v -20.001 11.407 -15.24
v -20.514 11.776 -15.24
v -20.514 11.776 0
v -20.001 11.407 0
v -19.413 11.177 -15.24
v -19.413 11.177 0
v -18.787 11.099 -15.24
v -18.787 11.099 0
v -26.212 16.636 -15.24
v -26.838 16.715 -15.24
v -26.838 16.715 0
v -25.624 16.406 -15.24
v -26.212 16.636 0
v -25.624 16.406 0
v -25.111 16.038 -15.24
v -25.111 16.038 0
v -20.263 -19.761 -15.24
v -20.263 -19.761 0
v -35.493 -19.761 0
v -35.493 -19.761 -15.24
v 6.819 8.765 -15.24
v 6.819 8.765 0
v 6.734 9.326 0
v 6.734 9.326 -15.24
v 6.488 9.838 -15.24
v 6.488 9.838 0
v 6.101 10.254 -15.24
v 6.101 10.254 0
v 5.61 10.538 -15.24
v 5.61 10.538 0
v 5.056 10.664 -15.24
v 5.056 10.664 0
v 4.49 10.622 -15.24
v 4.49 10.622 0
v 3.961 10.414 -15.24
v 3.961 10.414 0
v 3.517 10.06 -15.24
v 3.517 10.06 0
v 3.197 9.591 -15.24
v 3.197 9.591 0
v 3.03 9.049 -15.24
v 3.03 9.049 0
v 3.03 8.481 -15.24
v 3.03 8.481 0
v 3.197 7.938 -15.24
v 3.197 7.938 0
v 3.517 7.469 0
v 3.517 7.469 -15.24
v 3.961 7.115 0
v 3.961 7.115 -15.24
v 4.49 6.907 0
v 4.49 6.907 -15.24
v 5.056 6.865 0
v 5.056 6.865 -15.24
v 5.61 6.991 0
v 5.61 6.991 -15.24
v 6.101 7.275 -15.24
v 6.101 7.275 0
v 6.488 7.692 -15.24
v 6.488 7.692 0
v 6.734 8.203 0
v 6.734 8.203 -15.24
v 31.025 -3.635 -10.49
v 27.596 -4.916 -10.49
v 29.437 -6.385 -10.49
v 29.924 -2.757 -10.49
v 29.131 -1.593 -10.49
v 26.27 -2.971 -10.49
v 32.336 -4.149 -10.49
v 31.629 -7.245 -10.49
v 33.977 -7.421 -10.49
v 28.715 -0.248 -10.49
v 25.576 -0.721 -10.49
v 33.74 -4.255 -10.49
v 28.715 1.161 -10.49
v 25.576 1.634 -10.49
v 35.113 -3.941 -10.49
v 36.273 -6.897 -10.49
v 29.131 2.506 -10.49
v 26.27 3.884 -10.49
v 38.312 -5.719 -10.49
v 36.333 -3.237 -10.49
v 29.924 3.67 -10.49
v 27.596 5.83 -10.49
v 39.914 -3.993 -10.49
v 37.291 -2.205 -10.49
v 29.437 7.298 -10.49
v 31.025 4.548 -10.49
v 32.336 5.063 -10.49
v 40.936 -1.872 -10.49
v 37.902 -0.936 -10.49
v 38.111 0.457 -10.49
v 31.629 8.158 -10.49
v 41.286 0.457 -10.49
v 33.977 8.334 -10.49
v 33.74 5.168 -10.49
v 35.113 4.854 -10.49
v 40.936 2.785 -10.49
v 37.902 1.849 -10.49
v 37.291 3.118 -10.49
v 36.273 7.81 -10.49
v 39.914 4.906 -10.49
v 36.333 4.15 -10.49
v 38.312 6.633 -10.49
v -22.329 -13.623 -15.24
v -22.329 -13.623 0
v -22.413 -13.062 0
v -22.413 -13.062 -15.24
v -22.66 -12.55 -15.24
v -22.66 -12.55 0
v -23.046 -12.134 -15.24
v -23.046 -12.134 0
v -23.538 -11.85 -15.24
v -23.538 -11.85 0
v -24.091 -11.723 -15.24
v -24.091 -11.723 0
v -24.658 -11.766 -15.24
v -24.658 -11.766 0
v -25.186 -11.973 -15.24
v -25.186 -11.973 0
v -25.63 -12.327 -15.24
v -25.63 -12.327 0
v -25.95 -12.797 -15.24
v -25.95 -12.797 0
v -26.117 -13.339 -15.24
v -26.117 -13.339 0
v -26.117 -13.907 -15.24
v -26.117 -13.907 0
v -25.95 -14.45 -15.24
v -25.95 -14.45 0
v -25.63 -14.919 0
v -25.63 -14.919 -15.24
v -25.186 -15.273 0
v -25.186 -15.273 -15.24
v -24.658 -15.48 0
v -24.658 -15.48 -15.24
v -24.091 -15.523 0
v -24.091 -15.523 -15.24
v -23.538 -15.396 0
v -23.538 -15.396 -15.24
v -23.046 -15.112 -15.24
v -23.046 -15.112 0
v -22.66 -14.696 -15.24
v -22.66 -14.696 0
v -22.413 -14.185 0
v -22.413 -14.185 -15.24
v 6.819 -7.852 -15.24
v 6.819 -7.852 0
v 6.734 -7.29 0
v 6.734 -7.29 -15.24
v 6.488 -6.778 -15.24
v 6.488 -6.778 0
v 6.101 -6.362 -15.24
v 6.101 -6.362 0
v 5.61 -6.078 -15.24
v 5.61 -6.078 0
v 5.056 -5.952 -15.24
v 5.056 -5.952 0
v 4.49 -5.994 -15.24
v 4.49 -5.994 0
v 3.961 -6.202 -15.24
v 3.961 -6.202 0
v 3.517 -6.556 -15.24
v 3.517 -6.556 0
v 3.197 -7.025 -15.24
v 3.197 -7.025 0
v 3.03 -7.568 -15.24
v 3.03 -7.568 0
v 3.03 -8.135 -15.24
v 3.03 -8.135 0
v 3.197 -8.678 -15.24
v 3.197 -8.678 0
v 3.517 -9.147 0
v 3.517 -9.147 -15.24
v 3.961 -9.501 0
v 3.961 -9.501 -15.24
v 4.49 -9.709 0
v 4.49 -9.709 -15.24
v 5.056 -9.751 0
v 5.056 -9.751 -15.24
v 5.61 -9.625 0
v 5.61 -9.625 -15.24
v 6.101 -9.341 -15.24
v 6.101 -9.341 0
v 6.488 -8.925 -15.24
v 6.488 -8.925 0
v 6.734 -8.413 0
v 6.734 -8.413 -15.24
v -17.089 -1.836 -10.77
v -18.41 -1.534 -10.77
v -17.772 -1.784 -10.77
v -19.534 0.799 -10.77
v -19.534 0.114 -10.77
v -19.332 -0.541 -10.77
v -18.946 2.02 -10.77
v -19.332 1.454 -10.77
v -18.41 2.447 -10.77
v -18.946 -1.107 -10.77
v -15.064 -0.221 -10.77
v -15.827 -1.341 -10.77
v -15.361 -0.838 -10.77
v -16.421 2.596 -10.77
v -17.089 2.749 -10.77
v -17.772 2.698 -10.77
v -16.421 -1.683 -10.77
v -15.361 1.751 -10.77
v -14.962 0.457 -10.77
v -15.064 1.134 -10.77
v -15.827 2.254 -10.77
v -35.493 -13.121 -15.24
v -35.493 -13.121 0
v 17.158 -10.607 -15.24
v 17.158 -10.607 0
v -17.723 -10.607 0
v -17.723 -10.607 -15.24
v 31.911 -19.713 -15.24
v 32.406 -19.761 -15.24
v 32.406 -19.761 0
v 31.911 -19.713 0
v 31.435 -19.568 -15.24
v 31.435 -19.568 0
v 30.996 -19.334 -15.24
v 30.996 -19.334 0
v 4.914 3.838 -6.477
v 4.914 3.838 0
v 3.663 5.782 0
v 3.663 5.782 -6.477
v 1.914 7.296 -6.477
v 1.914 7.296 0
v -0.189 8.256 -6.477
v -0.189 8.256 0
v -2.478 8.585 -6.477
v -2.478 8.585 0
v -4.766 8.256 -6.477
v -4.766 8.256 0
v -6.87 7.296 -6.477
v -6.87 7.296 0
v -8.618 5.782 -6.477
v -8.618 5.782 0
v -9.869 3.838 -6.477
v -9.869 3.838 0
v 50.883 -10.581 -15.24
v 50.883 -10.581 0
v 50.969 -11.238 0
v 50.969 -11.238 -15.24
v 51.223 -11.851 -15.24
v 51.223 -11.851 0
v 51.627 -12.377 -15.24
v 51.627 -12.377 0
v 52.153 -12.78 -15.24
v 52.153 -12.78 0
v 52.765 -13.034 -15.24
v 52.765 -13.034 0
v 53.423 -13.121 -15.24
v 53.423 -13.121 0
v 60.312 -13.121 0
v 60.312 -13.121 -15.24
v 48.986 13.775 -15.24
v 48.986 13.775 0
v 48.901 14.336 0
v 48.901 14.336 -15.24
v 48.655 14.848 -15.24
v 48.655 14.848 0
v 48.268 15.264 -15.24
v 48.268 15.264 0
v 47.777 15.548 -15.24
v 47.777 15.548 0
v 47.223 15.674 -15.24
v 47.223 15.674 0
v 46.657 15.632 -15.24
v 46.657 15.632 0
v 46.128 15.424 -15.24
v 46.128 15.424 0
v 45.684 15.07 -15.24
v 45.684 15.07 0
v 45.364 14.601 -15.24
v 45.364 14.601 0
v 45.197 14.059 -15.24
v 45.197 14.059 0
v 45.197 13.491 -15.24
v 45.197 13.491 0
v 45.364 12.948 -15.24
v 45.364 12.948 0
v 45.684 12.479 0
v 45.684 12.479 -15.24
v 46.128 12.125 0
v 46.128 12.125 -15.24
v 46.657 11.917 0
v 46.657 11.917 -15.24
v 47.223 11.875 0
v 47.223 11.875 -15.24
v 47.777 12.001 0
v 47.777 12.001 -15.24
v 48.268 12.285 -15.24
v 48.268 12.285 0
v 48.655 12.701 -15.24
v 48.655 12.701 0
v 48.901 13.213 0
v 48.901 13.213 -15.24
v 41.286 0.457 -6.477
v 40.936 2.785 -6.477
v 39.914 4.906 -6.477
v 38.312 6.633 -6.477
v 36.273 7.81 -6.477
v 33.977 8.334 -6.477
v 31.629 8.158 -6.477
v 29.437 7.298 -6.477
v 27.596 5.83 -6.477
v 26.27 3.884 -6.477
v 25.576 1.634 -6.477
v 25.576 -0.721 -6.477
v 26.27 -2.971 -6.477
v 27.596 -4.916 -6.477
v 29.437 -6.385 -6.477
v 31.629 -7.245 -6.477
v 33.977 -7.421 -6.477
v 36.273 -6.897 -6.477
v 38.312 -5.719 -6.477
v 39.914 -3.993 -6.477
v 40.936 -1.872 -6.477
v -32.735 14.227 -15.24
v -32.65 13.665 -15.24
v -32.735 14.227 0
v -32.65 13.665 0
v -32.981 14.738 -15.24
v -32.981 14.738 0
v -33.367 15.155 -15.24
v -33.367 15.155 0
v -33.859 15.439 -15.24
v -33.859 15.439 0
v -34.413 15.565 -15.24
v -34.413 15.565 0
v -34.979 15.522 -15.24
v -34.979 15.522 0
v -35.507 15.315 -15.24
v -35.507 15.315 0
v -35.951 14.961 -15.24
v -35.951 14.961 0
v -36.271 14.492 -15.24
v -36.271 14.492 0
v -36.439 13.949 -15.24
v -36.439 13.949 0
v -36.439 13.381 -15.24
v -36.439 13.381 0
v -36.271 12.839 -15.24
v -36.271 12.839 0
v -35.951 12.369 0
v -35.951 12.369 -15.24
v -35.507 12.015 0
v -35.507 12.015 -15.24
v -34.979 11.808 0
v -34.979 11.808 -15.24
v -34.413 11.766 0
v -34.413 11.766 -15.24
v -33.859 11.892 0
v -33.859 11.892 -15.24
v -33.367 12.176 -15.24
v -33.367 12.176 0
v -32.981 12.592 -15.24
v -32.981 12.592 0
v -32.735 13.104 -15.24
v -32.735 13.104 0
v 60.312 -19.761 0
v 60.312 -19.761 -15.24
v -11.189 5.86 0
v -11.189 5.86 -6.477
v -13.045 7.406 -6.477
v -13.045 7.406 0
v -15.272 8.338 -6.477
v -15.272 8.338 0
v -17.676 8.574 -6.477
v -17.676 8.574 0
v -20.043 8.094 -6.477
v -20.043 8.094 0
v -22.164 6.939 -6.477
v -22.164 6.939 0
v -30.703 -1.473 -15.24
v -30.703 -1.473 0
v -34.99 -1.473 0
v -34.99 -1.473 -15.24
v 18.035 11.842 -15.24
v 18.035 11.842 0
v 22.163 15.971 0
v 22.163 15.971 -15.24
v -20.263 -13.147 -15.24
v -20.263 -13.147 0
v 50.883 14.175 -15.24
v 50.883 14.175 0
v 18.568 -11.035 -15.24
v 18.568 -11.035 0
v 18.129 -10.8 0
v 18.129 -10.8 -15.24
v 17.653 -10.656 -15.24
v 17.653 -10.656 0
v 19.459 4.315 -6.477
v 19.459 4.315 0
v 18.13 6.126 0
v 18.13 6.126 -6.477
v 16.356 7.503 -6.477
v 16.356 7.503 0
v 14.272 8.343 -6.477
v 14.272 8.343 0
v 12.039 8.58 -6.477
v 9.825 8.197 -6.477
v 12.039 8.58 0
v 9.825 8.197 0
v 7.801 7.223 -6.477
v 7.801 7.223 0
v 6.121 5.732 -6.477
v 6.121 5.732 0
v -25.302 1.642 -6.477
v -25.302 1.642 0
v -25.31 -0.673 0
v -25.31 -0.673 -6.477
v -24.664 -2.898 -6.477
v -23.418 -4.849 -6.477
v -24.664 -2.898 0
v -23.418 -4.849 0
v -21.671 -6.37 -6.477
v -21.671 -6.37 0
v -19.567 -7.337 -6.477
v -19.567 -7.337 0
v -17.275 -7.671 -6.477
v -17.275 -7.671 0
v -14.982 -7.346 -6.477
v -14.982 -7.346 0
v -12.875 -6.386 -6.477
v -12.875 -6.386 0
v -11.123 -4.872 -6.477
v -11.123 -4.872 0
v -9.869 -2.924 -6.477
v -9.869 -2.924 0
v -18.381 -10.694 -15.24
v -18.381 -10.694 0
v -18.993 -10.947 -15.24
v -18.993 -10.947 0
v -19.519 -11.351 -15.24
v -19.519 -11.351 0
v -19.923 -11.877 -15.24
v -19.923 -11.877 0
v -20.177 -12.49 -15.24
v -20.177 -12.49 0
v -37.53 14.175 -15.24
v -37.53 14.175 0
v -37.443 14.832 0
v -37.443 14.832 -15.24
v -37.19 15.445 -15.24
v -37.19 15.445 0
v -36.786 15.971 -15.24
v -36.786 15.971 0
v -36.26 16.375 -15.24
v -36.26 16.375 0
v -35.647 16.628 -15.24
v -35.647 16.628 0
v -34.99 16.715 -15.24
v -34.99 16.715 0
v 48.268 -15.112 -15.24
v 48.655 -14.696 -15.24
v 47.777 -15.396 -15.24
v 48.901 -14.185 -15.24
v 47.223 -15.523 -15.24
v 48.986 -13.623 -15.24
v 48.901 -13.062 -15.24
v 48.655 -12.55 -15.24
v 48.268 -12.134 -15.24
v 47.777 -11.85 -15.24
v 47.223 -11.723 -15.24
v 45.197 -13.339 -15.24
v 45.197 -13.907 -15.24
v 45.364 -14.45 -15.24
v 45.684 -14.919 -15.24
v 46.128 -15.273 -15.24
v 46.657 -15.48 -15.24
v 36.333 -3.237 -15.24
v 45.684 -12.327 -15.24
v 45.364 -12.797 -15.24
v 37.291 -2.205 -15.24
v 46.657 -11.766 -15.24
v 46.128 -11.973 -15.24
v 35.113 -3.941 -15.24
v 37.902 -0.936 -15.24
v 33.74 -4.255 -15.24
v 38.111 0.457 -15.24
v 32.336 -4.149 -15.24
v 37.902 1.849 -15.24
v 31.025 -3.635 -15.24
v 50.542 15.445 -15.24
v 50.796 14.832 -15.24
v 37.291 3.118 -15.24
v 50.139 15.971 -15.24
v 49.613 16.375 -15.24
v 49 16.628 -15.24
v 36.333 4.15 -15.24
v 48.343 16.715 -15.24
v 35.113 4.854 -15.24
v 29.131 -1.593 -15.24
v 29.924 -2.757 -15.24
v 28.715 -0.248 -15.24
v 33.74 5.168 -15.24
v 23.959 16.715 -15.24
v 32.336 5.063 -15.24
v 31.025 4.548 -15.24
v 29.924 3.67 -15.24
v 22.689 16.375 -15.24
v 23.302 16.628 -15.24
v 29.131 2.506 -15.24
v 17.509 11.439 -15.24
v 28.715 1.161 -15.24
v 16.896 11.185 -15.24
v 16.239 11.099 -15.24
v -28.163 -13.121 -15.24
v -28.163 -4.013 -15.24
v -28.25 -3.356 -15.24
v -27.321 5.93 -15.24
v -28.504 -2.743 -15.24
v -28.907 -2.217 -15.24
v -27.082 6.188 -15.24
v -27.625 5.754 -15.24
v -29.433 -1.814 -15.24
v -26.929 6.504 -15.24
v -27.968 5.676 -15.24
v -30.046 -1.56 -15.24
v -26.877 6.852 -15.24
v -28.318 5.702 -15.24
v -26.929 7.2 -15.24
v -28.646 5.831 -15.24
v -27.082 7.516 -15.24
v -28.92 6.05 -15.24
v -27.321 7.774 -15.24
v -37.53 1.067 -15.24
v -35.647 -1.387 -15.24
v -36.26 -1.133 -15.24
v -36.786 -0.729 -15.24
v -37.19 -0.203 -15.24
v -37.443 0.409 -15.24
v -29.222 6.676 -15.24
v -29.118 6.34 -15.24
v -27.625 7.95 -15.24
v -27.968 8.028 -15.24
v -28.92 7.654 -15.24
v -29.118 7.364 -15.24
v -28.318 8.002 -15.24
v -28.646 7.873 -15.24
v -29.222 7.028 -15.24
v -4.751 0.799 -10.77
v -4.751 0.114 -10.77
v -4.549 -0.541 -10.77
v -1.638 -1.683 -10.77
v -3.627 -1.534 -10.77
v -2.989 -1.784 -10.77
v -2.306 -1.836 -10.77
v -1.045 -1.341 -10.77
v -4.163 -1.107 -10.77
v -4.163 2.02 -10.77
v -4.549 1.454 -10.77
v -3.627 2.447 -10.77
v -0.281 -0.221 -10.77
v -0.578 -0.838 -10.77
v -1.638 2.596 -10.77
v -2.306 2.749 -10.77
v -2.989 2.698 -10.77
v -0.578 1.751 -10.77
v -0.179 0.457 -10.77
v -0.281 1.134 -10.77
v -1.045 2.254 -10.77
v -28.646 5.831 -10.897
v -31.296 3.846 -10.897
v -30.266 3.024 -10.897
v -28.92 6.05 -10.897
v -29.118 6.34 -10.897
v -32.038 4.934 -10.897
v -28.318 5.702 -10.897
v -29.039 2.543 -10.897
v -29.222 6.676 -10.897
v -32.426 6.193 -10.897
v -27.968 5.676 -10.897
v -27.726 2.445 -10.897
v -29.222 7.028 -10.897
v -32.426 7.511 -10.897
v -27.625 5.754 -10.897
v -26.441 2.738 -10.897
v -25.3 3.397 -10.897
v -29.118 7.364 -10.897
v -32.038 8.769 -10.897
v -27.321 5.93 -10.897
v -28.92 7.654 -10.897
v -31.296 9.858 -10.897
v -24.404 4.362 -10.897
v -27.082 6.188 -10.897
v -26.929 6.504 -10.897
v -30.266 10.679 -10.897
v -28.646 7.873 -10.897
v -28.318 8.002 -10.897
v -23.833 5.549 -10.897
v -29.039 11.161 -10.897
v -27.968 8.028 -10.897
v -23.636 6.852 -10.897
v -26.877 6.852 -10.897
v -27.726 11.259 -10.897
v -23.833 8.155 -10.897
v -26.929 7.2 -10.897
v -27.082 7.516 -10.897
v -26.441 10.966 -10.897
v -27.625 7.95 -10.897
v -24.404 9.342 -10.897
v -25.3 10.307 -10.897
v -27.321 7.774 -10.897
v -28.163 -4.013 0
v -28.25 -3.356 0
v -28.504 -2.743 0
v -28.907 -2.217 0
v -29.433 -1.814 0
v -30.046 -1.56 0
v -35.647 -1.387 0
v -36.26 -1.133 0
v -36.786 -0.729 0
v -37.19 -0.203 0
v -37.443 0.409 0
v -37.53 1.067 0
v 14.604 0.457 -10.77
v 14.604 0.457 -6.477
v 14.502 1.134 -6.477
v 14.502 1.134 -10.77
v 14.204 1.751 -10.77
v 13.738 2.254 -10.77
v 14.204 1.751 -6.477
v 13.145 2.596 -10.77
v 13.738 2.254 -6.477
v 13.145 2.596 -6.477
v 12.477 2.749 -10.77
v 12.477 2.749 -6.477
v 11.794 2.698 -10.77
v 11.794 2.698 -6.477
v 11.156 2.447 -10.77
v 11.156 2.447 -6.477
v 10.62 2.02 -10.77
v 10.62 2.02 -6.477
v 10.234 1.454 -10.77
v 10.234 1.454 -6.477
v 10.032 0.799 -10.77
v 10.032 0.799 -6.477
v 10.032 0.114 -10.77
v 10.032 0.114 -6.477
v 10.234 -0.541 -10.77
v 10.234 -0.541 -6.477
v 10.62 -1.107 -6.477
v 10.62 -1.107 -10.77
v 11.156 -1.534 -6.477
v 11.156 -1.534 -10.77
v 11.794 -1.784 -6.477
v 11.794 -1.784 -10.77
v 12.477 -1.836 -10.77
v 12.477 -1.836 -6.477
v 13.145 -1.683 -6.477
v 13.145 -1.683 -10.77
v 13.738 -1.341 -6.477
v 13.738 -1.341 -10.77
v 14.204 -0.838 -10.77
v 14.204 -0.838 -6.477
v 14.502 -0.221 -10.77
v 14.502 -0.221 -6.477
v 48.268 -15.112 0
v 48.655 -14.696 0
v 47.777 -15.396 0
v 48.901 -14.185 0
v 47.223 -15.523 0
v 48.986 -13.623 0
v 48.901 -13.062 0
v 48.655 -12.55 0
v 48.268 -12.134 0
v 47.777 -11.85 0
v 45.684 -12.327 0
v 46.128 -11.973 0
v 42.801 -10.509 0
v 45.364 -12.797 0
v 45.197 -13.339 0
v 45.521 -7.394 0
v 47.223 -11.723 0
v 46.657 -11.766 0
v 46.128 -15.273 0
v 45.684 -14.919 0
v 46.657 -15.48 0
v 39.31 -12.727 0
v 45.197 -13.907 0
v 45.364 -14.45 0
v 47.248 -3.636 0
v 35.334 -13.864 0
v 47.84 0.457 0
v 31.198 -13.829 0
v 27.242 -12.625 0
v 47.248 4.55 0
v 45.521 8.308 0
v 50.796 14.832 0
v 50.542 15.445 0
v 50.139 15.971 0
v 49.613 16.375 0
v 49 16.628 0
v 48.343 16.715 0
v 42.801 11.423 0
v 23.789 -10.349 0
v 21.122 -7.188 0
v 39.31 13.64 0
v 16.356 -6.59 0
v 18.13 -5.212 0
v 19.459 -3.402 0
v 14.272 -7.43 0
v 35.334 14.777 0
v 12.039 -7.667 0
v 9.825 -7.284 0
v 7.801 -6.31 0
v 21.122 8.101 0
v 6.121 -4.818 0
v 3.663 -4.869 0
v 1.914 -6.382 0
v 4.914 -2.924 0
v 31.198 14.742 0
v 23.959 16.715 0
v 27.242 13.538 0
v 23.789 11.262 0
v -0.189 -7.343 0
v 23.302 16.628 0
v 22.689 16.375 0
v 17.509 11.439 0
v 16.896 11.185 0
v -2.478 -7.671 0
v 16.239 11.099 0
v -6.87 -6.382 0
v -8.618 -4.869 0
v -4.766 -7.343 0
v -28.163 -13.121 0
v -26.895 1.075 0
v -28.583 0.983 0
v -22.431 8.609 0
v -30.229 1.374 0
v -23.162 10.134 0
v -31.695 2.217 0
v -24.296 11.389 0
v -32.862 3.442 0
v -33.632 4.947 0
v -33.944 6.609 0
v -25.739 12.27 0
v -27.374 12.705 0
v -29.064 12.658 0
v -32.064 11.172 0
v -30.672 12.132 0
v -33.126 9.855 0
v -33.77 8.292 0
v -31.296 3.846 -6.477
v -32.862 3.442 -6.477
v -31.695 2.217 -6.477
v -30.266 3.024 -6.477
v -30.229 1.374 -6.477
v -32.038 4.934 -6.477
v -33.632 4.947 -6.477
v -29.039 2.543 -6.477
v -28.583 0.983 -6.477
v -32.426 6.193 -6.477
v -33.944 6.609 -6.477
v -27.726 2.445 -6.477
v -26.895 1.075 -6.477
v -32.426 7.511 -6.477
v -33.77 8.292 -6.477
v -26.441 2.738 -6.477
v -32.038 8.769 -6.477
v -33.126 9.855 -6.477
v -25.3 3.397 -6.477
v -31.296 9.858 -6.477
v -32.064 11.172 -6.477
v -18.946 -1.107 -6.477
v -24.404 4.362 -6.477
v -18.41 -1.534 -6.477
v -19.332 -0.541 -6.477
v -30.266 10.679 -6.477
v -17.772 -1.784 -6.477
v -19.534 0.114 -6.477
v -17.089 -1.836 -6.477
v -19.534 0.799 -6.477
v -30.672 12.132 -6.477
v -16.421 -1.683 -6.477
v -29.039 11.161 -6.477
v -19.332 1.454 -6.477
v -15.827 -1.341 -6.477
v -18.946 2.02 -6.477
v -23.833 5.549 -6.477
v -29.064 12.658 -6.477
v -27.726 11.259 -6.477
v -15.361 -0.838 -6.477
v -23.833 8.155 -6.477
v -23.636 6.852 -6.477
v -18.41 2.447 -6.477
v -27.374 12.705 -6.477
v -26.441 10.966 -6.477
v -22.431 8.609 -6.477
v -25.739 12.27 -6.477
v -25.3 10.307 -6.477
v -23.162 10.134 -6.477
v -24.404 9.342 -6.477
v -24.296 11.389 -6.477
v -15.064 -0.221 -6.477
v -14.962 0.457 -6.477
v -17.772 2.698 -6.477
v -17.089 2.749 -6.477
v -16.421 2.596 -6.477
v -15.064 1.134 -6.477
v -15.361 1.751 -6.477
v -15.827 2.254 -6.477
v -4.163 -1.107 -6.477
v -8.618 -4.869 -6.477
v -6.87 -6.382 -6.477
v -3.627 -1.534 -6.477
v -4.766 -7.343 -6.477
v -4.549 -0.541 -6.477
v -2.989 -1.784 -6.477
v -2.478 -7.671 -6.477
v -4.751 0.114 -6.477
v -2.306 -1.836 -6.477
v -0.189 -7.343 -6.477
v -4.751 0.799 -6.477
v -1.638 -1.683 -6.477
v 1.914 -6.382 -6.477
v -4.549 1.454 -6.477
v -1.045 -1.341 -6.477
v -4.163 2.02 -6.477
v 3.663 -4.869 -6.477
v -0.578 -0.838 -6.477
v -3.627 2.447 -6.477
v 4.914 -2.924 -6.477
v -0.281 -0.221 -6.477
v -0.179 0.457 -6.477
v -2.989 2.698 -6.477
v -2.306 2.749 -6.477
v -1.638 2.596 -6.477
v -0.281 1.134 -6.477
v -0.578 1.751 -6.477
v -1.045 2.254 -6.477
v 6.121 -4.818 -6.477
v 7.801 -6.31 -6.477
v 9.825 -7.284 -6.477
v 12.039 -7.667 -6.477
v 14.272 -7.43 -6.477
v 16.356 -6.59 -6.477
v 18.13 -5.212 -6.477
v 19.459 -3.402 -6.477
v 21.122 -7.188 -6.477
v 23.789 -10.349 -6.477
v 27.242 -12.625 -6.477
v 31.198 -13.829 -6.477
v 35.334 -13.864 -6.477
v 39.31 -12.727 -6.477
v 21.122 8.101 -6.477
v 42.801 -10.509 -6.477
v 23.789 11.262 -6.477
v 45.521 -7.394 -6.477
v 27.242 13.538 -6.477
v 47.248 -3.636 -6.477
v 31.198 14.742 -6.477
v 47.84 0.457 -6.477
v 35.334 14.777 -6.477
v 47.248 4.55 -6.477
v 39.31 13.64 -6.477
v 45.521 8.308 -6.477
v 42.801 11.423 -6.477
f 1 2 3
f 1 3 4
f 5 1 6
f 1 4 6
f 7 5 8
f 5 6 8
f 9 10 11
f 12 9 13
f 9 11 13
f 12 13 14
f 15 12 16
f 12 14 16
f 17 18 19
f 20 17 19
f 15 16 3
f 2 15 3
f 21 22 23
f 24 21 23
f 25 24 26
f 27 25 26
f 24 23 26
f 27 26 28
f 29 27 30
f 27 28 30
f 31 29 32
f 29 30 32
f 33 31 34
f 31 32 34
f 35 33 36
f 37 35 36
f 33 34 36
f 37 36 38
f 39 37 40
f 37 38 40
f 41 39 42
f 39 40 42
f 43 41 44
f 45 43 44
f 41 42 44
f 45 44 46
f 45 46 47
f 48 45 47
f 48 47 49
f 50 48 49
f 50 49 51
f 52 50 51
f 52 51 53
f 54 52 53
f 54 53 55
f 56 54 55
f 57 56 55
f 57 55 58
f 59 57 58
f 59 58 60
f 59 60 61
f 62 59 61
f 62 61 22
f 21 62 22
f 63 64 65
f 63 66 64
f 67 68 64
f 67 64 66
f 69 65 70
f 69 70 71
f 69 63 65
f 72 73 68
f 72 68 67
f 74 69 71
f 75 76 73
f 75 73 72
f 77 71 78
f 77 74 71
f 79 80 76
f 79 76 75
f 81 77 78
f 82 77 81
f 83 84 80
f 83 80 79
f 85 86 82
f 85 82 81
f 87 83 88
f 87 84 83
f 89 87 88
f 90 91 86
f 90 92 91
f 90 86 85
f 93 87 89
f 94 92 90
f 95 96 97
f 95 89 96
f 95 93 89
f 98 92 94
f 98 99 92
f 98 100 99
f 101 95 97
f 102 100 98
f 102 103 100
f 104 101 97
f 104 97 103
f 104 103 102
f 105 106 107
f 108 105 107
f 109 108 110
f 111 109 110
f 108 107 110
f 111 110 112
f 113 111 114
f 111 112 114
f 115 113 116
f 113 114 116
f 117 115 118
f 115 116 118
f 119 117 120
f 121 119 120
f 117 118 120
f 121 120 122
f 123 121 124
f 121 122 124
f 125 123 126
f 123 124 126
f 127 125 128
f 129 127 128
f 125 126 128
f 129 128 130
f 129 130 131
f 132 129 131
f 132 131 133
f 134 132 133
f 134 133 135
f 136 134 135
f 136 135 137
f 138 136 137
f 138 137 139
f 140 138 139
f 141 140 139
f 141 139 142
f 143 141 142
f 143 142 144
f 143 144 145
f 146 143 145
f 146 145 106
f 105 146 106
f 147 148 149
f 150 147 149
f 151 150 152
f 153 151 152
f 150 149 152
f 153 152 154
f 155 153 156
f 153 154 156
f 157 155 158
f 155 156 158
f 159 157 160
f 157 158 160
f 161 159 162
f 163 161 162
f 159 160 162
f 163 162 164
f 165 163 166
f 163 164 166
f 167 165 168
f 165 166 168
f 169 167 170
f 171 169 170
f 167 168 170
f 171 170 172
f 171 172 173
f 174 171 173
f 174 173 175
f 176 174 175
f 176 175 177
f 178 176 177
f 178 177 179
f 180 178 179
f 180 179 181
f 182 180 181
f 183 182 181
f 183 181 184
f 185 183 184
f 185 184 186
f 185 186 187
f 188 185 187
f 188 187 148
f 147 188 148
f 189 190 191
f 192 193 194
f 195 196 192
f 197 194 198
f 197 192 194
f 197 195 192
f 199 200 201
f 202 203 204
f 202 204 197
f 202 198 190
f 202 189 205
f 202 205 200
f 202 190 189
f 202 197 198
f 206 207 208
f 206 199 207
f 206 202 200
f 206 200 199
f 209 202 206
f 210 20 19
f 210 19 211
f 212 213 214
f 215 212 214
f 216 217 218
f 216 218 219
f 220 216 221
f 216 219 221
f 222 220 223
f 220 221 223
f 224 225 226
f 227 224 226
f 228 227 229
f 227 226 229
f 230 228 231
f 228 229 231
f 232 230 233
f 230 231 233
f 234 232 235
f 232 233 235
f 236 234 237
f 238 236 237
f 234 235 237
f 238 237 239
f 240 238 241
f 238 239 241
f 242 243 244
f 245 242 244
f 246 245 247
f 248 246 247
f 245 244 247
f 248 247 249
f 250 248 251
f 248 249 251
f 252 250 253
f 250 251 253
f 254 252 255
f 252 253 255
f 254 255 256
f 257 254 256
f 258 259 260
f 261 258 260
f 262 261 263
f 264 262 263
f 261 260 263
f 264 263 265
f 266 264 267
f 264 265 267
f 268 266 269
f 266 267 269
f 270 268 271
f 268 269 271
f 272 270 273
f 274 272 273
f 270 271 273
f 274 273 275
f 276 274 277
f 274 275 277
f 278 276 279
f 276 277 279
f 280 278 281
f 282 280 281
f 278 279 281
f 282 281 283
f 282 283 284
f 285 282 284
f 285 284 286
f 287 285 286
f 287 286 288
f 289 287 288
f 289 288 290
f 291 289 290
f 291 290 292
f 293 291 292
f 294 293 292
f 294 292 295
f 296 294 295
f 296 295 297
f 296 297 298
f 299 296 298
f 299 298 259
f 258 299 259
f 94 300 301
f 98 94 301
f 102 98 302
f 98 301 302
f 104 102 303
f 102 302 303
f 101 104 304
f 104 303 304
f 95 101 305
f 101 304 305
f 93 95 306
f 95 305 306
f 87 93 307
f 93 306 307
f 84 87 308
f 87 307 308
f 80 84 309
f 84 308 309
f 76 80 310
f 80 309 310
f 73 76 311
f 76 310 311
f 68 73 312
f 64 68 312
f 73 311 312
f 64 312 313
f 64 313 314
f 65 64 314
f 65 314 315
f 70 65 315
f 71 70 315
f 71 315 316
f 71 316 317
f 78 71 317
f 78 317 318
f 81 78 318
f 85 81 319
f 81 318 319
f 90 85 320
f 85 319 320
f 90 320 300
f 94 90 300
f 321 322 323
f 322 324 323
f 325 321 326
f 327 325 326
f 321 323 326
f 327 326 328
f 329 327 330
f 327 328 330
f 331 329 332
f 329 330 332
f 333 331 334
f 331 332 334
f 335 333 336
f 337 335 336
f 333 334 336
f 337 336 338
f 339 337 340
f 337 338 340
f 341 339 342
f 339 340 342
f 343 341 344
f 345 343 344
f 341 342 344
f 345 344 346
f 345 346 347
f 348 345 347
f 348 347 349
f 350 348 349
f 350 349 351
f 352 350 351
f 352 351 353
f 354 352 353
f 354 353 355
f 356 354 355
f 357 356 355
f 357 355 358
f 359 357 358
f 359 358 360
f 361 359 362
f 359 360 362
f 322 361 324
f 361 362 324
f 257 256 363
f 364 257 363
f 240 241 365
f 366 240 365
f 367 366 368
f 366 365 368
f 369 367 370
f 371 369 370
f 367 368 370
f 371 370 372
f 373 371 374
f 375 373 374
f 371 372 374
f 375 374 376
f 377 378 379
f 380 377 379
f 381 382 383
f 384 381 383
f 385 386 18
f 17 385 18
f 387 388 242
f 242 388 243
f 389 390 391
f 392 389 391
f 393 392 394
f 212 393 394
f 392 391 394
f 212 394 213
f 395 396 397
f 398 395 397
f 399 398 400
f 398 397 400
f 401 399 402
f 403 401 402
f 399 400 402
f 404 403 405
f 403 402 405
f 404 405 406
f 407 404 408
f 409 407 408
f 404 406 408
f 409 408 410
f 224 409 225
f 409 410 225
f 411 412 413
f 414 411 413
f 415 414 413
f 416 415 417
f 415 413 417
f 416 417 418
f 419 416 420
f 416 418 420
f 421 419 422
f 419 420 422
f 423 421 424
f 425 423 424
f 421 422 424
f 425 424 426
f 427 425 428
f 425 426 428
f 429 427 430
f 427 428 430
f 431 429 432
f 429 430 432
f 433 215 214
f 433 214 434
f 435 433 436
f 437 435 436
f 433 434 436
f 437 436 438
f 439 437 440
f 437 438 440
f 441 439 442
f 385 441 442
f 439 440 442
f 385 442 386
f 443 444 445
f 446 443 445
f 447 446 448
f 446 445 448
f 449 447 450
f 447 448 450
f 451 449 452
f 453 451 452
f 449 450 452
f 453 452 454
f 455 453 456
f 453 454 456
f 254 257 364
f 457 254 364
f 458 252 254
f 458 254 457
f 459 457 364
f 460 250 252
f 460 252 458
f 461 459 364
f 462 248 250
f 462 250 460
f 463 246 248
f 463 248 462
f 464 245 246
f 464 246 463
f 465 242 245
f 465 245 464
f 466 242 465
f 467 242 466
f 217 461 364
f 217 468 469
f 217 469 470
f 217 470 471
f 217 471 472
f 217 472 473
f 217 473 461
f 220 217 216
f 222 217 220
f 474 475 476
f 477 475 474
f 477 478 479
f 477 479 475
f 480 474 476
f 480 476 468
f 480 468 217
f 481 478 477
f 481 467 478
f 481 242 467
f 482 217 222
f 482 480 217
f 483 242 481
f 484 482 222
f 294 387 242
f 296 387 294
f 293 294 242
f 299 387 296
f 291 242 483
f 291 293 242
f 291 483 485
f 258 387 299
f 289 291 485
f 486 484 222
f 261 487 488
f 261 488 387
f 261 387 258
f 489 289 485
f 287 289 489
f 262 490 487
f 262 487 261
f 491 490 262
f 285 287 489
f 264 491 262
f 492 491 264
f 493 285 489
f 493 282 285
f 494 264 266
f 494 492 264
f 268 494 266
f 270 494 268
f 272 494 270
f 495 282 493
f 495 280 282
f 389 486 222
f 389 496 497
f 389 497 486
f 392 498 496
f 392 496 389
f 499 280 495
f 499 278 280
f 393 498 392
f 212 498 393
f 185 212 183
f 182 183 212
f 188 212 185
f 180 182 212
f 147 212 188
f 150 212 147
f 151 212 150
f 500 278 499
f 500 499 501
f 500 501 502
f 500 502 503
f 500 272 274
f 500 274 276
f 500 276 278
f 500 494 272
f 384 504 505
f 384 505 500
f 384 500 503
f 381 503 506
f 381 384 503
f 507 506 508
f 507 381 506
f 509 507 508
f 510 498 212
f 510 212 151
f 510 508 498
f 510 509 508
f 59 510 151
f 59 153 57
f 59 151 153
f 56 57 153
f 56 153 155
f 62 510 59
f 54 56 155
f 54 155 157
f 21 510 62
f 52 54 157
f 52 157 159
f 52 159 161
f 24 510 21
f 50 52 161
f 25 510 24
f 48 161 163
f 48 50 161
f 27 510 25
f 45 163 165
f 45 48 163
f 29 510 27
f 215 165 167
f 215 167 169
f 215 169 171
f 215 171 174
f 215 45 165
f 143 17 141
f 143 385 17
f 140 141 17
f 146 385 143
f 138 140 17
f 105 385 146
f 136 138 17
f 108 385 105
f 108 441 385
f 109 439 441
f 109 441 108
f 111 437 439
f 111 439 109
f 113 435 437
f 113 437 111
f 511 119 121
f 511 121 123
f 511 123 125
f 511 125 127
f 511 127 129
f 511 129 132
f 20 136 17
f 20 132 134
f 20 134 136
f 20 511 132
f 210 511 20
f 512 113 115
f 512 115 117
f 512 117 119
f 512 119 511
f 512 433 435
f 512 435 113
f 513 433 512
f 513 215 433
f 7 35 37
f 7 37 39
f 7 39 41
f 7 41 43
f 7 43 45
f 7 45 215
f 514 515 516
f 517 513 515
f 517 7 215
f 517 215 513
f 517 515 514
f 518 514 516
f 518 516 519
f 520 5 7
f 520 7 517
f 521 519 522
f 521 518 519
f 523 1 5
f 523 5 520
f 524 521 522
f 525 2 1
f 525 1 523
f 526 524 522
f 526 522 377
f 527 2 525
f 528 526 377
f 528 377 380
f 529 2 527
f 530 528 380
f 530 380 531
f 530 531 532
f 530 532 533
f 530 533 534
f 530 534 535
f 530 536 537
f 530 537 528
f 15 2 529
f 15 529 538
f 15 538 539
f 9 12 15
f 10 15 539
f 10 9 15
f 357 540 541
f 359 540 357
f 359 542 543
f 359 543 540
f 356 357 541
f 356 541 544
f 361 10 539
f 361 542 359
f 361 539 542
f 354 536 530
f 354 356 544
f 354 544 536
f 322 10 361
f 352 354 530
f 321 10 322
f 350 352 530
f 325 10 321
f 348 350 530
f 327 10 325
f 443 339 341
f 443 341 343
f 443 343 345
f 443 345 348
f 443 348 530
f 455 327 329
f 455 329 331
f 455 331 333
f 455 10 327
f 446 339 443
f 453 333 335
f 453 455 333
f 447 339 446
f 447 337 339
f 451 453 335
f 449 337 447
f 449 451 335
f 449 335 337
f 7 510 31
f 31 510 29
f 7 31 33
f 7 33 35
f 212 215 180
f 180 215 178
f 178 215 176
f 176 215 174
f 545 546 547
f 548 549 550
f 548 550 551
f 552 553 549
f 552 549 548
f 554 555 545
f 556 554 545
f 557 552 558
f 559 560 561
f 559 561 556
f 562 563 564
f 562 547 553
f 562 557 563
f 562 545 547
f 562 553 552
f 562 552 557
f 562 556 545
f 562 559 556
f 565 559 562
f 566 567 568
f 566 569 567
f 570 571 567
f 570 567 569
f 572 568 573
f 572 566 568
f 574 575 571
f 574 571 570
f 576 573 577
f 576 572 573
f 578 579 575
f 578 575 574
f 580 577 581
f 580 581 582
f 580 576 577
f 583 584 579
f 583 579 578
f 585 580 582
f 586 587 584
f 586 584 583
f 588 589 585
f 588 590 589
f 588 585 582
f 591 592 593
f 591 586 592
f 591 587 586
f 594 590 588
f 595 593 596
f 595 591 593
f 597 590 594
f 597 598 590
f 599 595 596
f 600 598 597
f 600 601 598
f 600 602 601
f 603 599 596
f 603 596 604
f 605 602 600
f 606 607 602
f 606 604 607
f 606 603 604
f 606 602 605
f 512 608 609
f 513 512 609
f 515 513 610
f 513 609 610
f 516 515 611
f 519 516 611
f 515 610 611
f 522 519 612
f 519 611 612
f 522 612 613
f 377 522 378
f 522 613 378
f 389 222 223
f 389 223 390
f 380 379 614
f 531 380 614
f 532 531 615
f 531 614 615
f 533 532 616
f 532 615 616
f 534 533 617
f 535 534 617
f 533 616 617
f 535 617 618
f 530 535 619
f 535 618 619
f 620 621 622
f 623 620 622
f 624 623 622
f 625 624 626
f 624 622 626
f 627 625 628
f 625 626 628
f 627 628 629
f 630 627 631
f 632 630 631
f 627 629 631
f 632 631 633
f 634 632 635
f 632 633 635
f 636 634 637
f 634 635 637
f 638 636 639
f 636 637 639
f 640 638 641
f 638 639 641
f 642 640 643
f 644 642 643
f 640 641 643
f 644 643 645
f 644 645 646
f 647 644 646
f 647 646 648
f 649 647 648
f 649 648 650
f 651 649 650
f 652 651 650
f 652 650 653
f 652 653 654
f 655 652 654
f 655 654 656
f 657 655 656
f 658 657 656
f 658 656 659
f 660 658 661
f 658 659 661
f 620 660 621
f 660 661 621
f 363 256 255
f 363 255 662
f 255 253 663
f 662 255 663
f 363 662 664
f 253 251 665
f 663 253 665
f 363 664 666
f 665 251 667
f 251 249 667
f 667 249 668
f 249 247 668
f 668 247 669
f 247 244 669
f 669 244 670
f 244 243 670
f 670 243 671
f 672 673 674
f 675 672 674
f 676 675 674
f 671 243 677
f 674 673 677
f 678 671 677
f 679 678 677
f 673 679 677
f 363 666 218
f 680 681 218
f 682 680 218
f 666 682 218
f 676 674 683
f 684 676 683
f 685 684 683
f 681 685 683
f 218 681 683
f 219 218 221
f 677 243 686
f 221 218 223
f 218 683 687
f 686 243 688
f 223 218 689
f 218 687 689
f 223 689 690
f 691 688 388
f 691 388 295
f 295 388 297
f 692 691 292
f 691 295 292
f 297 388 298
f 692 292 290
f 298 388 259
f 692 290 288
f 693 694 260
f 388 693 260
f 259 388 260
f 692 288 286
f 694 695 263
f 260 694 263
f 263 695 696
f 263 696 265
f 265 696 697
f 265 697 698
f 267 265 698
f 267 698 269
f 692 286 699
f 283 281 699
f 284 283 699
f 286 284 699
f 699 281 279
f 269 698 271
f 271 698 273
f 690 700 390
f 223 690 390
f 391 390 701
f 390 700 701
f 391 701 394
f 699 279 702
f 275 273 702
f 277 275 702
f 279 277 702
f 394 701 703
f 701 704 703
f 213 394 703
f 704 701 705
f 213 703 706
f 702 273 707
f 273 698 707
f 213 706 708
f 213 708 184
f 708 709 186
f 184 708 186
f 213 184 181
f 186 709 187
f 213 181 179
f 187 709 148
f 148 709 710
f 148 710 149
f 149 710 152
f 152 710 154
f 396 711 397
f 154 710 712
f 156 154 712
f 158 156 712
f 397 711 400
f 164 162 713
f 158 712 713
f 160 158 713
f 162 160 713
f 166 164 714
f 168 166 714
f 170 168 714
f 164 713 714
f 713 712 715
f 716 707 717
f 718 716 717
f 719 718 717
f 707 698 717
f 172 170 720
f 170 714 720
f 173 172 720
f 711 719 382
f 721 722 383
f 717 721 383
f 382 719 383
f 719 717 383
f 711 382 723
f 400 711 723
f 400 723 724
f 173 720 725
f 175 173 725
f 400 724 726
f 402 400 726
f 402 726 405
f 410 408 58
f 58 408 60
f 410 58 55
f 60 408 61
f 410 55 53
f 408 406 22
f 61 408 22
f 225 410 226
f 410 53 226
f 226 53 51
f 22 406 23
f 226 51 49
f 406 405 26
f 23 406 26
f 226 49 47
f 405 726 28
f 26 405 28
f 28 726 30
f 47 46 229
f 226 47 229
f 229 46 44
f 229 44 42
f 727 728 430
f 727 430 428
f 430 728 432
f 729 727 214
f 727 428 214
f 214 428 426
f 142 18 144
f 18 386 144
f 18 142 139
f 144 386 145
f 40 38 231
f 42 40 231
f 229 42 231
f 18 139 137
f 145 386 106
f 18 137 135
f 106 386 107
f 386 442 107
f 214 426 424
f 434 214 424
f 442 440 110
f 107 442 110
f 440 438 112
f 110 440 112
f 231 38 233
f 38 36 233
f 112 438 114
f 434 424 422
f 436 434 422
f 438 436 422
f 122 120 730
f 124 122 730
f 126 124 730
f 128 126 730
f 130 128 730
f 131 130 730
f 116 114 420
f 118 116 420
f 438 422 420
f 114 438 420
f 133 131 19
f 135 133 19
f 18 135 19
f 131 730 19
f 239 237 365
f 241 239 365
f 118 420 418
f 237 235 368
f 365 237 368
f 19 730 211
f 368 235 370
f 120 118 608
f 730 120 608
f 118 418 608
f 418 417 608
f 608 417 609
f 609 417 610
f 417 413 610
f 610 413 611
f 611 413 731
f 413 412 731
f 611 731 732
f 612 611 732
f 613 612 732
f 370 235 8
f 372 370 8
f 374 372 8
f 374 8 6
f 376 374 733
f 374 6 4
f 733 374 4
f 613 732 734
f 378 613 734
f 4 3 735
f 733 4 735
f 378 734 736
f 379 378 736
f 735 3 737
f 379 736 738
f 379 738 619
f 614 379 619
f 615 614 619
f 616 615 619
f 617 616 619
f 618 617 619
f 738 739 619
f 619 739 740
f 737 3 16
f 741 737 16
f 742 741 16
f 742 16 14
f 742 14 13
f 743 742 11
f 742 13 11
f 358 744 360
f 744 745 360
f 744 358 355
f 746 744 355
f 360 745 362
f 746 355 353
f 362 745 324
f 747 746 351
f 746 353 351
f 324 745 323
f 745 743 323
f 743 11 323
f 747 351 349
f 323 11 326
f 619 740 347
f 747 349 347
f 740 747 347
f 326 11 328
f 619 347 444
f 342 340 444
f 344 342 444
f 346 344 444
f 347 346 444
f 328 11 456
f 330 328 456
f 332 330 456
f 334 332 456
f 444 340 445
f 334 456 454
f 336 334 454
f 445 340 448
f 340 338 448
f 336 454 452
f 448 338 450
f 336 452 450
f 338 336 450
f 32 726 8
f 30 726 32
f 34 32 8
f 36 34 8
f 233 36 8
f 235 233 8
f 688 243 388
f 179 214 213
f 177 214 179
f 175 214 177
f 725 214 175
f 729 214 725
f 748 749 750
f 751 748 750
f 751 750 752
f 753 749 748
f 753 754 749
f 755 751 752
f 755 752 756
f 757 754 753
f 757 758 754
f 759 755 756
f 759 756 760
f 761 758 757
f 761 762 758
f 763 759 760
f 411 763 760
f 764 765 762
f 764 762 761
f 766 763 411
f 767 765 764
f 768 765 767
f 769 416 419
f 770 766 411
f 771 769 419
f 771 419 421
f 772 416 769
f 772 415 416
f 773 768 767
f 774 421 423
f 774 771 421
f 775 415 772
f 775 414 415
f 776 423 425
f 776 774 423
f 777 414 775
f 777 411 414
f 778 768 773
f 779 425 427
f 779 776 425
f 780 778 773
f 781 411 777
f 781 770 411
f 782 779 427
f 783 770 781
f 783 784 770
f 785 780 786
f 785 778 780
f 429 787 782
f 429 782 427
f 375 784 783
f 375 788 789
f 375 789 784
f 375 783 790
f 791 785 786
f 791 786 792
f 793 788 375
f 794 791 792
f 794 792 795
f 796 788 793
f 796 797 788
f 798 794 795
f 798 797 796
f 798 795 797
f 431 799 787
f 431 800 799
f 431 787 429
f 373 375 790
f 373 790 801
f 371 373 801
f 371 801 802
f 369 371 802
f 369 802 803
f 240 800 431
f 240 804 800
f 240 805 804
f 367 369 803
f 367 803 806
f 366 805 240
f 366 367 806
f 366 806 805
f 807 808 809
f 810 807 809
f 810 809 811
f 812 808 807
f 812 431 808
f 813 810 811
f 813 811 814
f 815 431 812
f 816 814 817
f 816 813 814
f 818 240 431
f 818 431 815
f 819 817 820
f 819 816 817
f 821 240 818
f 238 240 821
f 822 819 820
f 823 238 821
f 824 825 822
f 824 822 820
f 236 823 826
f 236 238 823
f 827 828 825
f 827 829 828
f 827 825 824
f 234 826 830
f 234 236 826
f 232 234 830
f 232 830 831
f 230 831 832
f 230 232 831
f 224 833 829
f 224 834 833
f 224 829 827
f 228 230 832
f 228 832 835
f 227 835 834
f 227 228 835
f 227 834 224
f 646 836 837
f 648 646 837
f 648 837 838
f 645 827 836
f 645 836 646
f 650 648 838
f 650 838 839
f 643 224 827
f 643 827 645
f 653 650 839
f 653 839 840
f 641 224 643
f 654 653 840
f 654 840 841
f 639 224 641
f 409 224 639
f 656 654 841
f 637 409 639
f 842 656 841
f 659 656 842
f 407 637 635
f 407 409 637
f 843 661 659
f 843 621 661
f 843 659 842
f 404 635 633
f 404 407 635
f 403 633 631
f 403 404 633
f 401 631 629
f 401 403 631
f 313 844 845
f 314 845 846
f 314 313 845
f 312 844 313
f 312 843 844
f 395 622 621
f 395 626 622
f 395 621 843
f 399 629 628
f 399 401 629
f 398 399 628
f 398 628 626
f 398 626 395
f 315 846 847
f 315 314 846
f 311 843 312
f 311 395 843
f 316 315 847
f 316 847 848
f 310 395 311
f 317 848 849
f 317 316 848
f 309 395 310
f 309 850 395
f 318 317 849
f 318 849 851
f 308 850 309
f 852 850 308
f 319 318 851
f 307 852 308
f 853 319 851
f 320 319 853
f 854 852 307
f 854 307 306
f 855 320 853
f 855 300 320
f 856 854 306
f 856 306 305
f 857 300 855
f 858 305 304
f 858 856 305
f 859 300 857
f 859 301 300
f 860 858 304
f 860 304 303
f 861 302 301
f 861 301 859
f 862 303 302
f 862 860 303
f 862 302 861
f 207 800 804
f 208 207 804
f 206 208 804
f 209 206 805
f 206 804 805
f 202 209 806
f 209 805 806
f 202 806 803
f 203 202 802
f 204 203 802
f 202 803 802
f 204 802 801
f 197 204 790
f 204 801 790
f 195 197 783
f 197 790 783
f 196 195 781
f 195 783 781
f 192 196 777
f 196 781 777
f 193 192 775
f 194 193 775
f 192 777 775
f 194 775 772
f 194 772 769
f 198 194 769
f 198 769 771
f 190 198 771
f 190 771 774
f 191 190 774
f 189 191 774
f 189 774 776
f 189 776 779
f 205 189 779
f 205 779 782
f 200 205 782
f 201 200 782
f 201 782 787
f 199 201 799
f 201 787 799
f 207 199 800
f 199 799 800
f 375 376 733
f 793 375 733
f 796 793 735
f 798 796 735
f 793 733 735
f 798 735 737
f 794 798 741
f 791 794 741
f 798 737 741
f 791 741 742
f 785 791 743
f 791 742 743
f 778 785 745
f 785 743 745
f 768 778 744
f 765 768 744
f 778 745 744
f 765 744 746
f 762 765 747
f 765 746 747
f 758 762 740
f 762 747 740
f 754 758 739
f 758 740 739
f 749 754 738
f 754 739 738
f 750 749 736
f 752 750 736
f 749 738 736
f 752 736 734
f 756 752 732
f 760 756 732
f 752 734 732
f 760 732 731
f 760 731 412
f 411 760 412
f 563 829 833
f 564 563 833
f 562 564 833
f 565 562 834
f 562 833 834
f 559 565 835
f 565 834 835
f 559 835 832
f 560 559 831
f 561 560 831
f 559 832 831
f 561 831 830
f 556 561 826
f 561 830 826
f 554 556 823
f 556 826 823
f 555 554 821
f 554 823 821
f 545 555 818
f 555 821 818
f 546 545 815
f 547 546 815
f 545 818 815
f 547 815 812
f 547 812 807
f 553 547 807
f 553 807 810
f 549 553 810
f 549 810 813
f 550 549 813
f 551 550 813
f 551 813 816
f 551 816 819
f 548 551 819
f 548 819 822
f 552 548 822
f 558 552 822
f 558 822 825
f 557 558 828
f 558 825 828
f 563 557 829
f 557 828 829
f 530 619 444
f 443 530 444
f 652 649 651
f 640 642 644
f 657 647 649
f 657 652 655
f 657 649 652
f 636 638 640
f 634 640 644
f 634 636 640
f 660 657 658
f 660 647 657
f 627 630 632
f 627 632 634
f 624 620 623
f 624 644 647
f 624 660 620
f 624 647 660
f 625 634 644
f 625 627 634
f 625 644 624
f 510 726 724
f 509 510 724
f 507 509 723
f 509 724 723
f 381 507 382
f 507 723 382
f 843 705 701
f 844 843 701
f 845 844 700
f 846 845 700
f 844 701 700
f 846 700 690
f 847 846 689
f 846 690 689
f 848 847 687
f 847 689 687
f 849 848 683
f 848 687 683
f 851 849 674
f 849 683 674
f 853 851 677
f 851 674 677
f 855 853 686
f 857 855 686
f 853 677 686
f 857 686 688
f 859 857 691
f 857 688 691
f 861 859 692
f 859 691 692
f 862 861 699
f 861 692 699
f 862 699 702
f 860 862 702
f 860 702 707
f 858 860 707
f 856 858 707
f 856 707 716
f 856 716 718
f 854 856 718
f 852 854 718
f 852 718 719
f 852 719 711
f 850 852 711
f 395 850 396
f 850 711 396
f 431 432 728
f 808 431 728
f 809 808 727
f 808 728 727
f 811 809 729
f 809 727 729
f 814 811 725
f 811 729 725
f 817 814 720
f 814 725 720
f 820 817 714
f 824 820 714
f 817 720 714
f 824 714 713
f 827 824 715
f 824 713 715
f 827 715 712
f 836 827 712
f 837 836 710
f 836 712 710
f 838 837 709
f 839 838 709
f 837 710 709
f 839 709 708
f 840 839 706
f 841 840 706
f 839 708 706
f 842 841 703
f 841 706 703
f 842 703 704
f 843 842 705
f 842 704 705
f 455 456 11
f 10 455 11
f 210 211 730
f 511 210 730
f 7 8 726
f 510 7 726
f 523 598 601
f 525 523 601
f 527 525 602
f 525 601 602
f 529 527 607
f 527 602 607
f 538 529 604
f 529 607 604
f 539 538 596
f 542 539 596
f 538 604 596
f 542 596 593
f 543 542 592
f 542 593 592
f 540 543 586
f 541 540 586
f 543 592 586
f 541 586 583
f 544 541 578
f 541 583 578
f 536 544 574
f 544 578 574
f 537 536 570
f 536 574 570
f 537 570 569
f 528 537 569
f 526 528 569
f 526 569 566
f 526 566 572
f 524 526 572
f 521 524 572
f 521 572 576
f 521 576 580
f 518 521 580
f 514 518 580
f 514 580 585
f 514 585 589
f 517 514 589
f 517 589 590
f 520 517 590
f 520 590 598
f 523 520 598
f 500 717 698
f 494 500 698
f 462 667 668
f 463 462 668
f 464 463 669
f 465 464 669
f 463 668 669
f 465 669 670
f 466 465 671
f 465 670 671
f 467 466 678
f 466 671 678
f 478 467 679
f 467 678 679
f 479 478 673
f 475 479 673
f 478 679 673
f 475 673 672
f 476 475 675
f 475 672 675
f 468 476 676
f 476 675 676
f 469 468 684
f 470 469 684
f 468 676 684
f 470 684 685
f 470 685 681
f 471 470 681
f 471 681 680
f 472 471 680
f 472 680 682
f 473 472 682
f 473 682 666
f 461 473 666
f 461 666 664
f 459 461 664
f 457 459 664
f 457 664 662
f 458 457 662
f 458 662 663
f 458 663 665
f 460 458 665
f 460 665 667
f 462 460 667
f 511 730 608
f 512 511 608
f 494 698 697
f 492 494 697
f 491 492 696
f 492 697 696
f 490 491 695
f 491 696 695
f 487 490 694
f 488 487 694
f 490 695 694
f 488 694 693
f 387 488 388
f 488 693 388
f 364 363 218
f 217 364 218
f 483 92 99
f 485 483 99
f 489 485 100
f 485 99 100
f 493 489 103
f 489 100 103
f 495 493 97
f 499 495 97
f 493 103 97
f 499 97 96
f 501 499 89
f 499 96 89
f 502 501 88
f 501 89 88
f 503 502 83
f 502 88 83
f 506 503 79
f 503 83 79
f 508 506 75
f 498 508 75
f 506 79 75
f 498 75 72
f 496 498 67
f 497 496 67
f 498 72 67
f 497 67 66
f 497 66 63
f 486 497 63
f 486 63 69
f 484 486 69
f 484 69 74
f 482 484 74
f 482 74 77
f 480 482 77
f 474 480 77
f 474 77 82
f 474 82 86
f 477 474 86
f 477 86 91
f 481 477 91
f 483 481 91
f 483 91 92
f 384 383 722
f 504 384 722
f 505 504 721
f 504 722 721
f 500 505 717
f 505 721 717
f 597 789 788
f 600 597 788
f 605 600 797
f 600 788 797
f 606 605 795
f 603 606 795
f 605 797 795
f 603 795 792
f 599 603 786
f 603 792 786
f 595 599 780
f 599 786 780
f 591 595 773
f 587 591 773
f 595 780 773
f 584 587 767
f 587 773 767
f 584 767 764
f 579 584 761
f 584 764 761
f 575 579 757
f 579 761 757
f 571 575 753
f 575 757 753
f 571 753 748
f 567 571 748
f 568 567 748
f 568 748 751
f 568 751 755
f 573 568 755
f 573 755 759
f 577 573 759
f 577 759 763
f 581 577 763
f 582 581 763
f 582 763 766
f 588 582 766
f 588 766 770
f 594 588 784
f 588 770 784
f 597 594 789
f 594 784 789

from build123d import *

# Parameters (mm, degrees)
EXTRUDE3_DEPTH = 15.24
EXTRUDE4_DEPTH = 6.477
SKETCH7_R      = 7.8994
EXTRUDE5_DEPTH = 4.0132
SKETCH8_R      = 2.2987
EXTRUDE6_DEPTH = 4.2926
SKETCH9_R      = 4.4196
EXTRUDE7_DEPTH = 4.4196
SKETCH12_R     = 1.179287719
SKETCH12_R_2   = 1.905
SKETCH12_R_3   = 4.7244
EXTRUDE8_DEPTH = 19.177


with BuildPart() as part:
    # Sketch4 → Extrude3 (new body)
    with BuildSketch(Plane.XY):
        with BuildLine():
            Line((-34.989977361, 16.714860485), (-26.837942516, 16.714860485))
            ThreePointArc((-26.837942516, 16.714860485), (-25.910547148, 16.539503762), (-25.11120297, 16.037646178))
            Line((-25.11120297, 16.037646178), (-20.513533707, 11.775761749))
            ThreePointArc((-20.513533707, 11.775761749), (-19.714189529, 11.273904165), (-18.786794161, 11.098547442))
            Line((-18.786794161, 11.098547442), (16.238704516, 11.098547442))
            ThreePointArc((16.238704516, 11.098547442), (17.210720434, 11.291893429), (18.03475574, 11.842496218))
            Line((18.03475574, 11.842496218), (22.163171231, 15.970911709))
            ThreePointArc((22.163171231, 15.970911709), (22.987206537, 16.521514497), (23.959222455, 16.714860485))
            Line((23.959222455, 16.714860485), (48.342712132, 16.714860485))
            ThreePointArc((48.342712132, 16.714860485), (50.138763356, 15.970911709), (50.882712132, 14.174860485))
            Line((50.882712132, 14.174860485), (50.882712132, -10.580714332))
            ThreePointArc((50.882712132, -10.580714332), (51.626660908, -12.376765556), (53.422712132, -13.120714332))
            Line((53.422712132, -13.120714332), (60.311539532, -13.120714332))
            Line((60.311539532, -13.120714332), (60.311539532, -19.76149571))
            Line((60.311539532, -19.76149571), (32.406215876, -19.76149571))
            ThreePointArc((32.406215876, -19.76149571), (31.669198311, -19.652216819), (30.995598433, -19.333783198))
            Line((30.995598433, -19.333783198), (18.568386733, -11.034703794))
            ThreePointArc((18.568386733, -11.034703794), (17.894786855, -10.716270173), (17.157769291, -10.606991282))
            Line((17.157769291, -10.606991282), (-17.723220352, -10.606991282))
            ThreePointArc((-17.723220352, -10.606991282), (-19.519271576, -11.350940058), (-20.263220352, -13.146991282))
            Line((-20.263220352, -13.146991282), (-20.263220352, -19.76149571))
            Line((-20.263220352, -19.76149571), (-35.4927874, -19.76149571))
            Line((-35.4927874, -19.76149571), (-35.4927874, -13.120714332))
            Line((-35.4927874, -13.120714332), (-28.163499743, -13.120714332))
            Line((-28.163499743, -13.120714332), (-28.163499743, -4.013214075))
            ThreePointArc((-28.163499743, -4.013214075), (-28.907448519, -2.217162851), (-30.703499743, -1.473214075))
            Line((-30.703499743, -1.473214075), (-34.989977361, -1.473214075))
            ThreePointArc((-34.989977361, -1.473214075), (-36.786028585, -0.729265299), (-37.529977361, 1.066785925))
            Line((-37.529977361, 1.066785925), (-37.529977361, 14.174860485))
            ThreePointArc((-37.529977361, 14.174860485), (-36.786028585, 15.970911709), (-34.989977361, 16.714860485))
        make_face()
    extrude(amount=-EXTRUDE3_DEPTH)

    # Sketch1 → Extrude4 (cut)
    with BuildSketch(Plane.XY):
        with BuildLine():
            ThreePointArc((19.458991626, 4.314801956), (12.038580445, 8.580199555), (4.913681626, 3.837633204))
            ThreePointArc((4.913681626, 3.837633204), (-2.477718374, 8.584569756), (-9.869118374, 3.837633204))
            ThreePointArc((-9.869118374, 3.837633204), (-15.272484602, 8.337693135), (-22.163825334, 6.939004858))
            ThreePointArc((-22.163825334, 6.939004858), (-33.125915624, 9.855374055), (-25.30153955, 1.642471287))
            ThreePointArc((-25.30153955, 1.642471287), (-19.566986279, -7.337311806), (-9.869118374, -2.924493692))
            ThreePointArc((-9.869118374, -2.924493692), (-2.477718374, -7.671430244), (4.913681626, -2.924493692))
            ThreePointArc((4.913681626, -2.924493692), (12.038580445, -7.667060044), (19.458991626, -3.401662445))
            ThreePointArc((19.458991626, -3.401662445), (47.839681626, 0.456569756), (19.458991626, 4.314801956))
        make_face()
    extrude(amount=-EXTRUDE4_DEPTH, mode=Mode.SUBTRACT)

    # Sketch7 → Extrude5 (cut)
    with BuildSketch(Plane.XY.offset(-6.477)):
        with Locations((33.387081626, 0.456569756)):
            Circle(SKETCH7_R)
    extrude(amount=-EXTRUDE5_DEPTH, mode=Mode.SUBTRACT)

    # Sketch8 → Extrude6 (cut)
    with BuildSketch(Plane.XY.offset(-6.477)):
        with Locations((12.305081626, 0.456569756)):
            Circle(SKETCH8_R)
        with Locations((-2.477718374, 0.456569756)):
            Circle(SKETCH8_R)
        with Locations((-17.260518374, 0.456569756)):
            Circle(SKETCH8_R)
    extrude(amount=-EXTRUDE6_DEPTH, mode=Mode.SUBTRACT)

    # Sketch9 → Extrude7 (cut)
    with BuildSketch(Plane.XY.offset(-6.477)):
        with Locations((-28.055981517, 6.851899403)):
            Circle(SKETCH9_R)
    extrude(amount=-EXTRUDE7_DEPTH, mode=Mode.SUBTRACT)

    # Sketch12 → Extrude8 (cut, symmetric)
    with BuildSketch(Plane.XY):
        with Locations((-28.055981517, 6.851899403)):
            Circle(SKETCH12_R)
        with Locations((-24.233740004, -13.623099256)):
            Circle(SKETCH12_R_2)
        with Locations((47.080626595, -13.623099256)):
            Circle(SKETCH12_R_2)
        with Locations((47.080626595, 13.774579835)):
            Circle(SKETCH12_R_2)
        with Locations((33.387081626, 0.456569756)):
            Circle(SKETCH12_R_3)
        with Locations((4.913681626, -7.85150728)):
            Circle(SKETCH12_R_2)
        with Locations((4.913681626, 8.764646791)):
            Circle(SKETCH12_R_2)
        with Locations((-34.554939326, 13.665214221)):
            Circle(SKETCH12_R_2)
    extrude(amount=EXTRUDE8_DEPTH, both=True, mode=Mode.SUBTRACT)


solid = part.part
